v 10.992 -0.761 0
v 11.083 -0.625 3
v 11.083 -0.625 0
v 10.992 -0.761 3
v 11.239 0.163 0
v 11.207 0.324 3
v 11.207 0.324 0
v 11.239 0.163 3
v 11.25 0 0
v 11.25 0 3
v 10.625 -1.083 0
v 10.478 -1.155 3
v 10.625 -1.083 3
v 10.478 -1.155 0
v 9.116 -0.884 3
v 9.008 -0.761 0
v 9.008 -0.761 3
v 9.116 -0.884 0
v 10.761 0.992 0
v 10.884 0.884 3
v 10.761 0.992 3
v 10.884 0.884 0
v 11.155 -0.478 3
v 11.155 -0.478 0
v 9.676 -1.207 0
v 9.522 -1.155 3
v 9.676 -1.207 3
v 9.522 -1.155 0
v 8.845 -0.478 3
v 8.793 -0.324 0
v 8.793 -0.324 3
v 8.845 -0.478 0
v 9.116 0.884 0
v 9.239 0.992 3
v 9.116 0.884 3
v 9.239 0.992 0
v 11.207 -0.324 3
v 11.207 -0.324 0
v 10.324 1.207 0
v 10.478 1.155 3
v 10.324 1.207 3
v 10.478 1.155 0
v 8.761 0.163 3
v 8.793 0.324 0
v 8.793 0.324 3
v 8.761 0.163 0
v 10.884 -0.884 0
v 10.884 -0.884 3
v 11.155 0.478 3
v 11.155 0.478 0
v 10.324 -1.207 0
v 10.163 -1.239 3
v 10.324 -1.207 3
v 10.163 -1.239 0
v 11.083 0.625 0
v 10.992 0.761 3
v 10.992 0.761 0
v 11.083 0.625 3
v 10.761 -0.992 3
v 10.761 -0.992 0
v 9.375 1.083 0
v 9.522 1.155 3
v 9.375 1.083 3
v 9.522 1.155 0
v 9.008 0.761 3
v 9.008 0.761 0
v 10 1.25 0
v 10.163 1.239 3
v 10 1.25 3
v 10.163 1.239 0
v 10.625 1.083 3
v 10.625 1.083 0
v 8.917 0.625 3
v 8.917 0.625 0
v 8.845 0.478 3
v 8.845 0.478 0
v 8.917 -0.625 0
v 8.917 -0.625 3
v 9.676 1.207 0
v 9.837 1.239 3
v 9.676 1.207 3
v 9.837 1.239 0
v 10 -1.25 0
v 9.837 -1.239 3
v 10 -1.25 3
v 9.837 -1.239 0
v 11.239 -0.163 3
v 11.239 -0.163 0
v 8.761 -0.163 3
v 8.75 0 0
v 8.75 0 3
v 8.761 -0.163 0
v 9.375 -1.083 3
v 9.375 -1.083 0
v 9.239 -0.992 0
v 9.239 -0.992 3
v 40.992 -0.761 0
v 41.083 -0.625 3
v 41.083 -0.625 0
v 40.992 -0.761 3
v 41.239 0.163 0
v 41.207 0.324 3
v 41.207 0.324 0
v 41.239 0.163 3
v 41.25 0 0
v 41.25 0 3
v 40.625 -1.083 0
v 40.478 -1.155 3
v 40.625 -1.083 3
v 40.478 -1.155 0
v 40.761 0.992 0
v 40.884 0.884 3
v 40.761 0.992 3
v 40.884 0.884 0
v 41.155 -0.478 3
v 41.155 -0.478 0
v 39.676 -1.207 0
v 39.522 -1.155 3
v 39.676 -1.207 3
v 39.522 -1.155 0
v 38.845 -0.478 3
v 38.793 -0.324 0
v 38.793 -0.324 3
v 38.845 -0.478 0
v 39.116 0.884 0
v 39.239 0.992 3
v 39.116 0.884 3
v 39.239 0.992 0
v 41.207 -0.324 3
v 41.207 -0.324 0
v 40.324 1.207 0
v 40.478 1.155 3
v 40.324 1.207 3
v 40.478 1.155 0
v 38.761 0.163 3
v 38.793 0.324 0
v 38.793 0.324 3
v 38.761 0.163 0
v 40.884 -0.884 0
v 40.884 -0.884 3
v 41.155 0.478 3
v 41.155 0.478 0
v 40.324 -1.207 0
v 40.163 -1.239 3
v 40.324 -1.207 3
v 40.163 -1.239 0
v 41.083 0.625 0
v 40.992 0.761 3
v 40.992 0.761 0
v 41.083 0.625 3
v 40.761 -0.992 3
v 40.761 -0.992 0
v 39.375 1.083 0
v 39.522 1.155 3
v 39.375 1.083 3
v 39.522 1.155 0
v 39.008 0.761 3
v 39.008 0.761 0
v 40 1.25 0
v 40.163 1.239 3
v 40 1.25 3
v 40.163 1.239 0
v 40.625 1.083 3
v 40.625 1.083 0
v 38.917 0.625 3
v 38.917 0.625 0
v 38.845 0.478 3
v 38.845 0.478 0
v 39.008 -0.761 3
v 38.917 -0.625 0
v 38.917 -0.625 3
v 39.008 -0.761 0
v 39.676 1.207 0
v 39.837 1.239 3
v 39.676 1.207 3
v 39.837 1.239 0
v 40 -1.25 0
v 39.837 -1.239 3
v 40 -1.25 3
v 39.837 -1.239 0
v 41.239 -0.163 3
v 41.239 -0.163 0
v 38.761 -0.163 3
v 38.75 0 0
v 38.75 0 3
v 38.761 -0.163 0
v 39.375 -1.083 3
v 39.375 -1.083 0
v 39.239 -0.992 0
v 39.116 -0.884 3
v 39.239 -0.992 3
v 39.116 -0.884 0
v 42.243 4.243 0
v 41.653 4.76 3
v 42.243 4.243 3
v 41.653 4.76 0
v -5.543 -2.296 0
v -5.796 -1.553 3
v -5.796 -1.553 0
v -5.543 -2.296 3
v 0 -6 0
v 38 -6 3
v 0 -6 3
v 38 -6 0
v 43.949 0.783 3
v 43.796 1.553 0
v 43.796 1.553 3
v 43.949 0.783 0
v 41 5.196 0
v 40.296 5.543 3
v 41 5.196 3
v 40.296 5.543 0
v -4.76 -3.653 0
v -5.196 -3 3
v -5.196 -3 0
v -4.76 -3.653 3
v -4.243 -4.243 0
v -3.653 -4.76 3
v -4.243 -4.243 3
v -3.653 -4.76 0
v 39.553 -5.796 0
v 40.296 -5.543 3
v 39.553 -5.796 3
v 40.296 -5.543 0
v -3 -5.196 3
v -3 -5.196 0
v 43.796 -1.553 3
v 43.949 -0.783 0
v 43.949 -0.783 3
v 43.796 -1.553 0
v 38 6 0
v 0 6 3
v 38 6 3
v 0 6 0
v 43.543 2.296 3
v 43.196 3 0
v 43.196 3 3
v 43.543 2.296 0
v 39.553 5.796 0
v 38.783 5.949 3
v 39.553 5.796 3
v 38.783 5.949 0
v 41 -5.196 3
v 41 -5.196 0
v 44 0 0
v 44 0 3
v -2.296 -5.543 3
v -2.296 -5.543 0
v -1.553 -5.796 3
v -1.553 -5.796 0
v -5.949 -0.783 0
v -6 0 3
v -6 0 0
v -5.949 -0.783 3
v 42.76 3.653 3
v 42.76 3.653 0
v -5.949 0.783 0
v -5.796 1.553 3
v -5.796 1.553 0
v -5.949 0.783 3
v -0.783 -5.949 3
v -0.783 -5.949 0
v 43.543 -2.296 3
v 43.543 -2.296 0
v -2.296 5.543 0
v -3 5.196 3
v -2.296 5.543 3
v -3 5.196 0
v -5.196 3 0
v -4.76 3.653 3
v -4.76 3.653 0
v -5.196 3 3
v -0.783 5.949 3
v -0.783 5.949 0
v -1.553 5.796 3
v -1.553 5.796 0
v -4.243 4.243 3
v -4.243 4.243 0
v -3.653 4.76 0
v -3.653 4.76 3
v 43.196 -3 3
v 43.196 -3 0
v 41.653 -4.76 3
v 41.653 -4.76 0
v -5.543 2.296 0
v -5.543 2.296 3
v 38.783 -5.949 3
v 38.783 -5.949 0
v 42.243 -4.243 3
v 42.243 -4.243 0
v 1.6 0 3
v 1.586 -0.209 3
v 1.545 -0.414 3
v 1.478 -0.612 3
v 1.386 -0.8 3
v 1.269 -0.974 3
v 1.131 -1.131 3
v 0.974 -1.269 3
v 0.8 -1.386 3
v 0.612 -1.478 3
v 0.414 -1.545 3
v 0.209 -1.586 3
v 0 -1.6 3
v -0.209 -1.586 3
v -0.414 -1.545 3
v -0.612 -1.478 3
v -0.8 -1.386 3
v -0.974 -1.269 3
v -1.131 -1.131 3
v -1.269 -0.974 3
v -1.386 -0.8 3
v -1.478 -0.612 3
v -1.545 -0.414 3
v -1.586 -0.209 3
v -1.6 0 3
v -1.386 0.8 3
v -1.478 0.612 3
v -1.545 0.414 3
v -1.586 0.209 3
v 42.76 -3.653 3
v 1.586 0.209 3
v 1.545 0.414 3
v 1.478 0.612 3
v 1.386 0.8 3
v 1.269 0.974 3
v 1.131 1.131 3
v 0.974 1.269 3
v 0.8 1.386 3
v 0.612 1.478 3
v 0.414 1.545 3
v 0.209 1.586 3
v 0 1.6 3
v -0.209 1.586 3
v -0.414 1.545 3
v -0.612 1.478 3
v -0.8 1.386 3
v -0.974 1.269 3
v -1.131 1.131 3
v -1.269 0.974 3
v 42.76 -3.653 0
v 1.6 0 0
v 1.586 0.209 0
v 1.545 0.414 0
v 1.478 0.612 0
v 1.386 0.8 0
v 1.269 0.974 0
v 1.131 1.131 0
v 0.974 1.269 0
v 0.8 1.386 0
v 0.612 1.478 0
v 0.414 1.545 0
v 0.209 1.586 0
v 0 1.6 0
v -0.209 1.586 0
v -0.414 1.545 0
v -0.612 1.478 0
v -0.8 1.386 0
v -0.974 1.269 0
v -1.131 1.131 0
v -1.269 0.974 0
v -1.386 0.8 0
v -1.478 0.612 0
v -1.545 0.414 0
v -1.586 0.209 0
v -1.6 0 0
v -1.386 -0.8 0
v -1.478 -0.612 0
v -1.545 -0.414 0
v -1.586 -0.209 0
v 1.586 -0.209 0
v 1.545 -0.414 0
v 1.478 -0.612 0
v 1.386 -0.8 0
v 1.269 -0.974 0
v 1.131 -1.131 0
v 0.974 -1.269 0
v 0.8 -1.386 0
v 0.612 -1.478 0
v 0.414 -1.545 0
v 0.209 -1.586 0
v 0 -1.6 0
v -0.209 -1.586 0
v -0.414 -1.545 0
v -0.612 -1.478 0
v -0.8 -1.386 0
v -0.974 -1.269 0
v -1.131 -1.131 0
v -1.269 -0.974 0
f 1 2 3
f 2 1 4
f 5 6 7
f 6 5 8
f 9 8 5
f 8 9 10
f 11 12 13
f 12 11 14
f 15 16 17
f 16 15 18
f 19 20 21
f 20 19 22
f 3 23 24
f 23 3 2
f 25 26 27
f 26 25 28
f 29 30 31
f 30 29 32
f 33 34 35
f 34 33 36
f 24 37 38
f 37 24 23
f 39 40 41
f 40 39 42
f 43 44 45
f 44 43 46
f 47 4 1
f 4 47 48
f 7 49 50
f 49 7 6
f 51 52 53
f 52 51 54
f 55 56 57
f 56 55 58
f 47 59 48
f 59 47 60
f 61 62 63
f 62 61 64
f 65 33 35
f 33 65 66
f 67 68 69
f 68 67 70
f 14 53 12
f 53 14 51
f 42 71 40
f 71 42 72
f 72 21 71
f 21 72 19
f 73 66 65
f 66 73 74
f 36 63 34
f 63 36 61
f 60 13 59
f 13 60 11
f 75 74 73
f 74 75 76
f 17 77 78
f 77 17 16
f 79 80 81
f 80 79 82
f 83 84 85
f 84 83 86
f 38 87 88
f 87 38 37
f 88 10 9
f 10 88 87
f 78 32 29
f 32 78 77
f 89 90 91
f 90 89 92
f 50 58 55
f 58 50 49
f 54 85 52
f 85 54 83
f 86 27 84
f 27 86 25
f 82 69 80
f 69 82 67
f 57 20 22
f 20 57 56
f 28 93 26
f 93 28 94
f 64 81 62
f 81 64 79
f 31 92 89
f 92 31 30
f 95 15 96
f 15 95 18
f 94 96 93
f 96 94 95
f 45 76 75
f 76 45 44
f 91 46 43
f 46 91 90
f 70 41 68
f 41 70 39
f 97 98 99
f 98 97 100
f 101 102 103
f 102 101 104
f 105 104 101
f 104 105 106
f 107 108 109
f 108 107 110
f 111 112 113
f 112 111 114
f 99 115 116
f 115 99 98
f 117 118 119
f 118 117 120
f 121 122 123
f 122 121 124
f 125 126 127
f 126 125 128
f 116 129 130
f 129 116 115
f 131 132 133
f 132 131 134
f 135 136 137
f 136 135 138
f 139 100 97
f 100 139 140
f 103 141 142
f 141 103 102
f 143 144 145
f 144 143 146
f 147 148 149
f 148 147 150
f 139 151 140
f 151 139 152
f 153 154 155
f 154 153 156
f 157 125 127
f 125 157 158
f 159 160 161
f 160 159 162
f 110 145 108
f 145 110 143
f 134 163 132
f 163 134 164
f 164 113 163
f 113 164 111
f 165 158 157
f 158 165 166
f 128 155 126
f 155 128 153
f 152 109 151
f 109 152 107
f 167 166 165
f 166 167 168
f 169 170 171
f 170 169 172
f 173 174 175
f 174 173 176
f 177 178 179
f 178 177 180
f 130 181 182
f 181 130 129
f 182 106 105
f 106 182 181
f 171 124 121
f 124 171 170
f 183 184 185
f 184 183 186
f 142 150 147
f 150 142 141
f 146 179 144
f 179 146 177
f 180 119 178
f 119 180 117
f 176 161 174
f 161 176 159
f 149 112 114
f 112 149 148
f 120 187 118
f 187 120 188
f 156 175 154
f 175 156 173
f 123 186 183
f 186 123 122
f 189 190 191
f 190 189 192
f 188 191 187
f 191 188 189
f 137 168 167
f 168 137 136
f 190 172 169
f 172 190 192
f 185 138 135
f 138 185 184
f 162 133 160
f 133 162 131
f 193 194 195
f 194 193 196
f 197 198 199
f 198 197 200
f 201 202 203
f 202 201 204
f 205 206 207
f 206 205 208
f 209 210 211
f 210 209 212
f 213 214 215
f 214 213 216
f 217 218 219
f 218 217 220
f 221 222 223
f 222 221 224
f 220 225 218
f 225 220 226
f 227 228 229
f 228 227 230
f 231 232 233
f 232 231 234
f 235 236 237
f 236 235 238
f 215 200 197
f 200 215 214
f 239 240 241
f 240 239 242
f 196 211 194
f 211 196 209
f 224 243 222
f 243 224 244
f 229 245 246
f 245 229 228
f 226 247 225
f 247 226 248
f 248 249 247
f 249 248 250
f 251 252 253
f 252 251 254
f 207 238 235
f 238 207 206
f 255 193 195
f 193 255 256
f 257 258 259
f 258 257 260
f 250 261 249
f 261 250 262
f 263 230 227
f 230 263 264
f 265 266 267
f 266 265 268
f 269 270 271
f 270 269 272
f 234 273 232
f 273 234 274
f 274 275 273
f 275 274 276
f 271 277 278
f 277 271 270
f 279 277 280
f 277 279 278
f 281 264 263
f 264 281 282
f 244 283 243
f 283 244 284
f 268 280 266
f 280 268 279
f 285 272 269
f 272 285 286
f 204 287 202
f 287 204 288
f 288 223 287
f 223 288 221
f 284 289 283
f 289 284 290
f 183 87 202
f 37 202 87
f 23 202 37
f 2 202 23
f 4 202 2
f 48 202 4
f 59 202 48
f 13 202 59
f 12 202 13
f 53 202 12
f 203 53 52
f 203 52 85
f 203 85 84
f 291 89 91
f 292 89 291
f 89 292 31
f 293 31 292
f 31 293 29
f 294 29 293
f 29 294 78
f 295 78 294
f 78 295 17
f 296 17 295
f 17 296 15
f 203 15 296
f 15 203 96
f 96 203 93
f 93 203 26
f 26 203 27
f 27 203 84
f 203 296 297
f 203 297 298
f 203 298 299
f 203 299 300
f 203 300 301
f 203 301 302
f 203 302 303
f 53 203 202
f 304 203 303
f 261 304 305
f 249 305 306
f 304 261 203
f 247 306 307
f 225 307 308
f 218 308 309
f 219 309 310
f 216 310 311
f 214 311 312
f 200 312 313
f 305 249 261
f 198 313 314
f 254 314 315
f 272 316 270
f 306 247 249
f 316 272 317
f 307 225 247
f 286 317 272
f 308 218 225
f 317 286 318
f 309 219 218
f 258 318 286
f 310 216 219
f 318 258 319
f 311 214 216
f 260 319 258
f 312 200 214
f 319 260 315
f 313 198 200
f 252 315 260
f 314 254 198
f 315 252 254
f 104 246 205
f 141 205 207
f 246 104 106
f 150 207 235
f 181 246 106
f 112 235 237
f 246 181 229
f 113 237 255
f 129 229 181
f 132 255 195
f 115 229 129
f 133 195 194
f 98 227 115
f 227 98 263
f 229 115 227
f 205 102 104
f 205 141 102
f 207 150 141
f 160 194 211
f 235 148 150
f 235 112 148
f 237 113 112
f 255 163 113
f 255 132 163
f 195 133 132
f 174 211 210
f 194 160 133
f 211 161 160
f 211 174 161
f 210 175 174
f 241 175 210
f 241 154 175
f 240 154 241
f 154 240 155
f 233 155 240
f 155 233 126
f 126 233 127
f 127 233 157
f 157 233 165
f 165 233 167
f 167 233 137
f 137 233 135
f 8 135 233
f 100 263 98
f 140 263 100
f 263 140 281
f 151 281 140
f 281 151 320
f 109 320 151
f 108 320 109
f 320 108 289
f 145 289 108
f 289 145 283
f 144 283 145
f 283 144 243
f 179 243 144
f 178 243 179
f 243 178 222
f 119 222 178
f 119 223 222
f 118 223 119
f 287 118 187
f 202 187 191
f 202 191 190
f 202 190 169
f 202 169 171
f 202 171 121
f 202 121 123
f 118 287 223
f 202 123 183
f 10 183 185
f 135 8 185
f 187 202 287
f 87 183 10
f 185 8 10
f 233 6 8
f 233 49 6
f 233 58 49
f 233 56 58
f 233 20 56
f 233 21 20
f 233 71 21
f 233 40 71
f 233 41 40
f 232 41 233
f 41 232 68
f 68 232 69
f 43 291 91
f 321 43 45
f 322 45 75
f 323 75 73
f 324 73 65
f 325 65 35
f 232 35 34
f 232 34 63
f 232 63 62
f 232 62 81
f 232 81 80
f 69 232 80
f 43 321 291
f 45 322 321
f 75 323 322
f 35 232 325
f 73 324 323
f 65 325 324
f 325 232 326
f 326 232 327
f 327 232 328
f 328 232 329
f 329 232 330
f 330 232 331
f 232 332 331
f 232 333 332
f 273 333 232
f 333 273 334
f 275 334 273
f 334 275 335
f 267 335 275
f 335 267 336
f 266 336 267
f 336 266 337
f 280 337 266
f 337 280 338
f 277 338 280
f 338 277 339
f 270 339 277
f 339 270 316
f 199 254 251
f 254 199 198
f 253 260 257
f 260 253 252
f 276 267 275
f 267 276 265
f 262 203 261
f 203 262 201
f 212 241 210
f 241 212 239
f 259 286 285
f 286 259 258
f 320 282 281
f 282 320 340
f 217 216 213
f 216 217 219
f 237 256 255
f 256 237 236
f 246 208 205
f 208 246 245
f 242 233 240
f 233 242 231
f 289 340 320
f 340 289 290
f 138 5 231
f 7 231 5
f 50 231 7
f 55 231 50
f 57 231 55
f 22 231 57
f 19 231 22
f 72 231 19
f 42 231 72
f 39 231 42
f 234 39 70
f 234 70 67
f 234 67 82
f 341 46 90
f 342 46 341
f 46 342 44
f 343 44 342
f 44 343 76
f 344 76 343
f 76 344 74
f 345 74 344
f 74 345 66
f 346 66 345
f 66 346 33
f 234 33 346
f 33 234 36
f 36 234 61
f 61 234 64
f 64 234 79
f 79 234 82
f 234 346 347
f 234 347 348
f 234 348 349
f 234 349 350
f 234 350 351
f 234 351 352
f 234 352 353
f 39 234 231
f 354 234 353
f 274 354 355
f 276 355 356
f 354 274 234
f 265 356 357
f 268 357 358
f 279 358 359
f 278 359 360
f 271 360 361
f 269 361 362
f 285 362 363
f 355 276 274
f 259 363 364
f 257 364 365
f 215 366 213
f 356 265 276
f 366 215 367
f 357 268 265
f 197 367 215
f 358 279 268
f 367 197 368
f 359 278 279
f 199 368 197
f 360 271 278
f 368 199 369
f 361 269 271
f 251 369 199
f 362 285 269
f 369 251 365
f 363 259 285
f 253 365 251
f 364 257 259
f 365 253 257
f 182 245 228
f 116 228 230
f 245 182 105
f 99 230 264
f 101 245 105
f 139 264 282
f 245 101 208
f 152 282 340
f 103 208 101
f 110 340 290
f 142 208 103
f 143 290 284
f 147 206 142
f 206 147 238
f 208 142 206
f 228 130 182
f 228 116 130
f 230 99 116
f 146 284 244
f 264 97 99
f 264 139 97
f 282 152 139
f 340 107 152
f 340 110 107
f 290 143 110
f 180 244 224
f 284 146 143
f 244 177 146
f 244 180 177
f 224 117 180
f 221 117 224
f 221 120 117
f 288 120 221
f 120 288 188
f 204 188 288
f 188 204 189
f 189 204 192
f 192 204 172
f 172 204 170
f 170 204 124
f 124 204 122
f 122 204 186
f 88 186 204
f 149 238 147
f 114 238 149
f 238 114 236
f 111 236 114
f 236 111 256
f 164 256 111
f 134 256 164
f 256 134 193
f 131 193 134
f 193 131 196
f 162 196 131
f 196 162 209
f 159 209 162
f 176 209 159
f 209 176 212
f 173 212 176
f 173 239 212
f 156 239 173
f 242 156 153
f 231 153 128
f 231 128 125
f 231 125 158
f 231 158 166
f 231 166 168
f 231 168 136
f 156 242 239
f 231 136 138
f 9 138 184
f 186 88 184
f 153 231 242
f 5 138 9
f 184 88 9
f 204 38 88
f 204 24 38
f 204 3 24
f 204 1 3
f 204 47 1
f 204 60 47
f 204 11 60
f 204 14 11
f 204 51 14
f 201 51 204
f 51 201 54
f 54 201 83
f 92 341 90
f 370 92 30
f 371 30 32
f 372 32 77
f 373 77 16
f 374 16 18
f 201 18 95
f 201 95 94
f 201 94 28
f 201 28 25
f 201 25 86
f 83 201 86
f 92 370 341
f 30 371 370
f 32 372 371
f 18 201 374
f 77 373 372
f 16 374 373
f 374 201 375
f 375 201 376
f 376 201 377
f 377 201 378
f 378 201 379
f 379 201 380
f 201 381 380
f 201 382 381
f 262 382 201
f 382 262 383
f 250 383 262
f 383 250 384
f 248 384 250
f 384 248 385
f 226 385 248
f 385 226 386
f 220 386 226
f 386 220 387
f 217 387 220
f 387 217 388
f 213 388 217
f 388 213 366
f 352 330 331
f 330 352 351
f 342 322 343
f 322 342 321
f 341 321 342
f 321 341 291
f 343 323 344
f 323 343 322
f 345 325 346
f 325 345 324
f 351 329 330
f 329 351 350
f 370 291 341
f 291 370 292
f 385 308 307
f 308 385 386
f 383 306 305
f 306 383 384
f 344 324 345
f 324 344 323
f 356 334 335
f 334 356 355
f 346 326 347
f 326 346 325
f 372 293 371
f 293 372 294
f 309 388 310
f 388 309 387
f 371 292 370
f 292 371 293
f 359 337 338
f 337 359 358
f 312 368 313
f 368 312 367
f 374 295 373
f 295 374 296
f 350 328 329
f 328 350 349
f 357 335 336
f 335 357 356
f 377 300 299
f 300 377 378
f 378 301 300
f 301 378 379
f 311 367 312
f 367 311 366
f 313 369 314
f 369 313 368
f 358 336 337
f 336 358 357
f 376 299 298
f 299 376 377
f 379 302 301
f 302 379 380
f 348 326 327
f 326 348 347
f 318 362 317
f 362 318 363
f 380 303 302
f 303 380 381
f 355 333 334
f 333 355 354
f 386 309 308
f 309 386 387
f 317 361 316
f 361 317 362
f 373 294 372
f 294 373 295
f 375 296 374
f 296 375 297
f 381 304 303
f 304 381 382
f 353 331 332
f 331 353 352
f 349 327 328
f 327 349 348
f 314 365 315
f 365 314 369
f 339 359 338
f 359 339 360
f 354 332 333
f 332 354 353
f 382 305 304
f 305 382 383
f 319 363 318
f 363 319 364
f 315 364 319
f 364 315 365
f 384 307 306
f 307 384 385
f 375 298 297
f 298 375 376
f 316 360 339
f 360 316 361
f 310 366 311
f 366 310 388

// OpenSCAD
// Pump lever in mm. Print flat or cut from 3 mm acetal.
// Two M3 adjuster/pad holes (local x=10 and x=40); pads sit on opposite faces.
$fn = 48;
difference() {
    hull() {
        for (x = [0, 38]) translate([x, 0, 0]) cylinder(h=3, r=6);
    }
    translate([0, 0, -1]) cylinder(h=5, d=3.2); // pivot
    for (x = [10, 40]) translate([x, 0, -1]) cylinder(h=5, d=2.5); // tap M3
}
